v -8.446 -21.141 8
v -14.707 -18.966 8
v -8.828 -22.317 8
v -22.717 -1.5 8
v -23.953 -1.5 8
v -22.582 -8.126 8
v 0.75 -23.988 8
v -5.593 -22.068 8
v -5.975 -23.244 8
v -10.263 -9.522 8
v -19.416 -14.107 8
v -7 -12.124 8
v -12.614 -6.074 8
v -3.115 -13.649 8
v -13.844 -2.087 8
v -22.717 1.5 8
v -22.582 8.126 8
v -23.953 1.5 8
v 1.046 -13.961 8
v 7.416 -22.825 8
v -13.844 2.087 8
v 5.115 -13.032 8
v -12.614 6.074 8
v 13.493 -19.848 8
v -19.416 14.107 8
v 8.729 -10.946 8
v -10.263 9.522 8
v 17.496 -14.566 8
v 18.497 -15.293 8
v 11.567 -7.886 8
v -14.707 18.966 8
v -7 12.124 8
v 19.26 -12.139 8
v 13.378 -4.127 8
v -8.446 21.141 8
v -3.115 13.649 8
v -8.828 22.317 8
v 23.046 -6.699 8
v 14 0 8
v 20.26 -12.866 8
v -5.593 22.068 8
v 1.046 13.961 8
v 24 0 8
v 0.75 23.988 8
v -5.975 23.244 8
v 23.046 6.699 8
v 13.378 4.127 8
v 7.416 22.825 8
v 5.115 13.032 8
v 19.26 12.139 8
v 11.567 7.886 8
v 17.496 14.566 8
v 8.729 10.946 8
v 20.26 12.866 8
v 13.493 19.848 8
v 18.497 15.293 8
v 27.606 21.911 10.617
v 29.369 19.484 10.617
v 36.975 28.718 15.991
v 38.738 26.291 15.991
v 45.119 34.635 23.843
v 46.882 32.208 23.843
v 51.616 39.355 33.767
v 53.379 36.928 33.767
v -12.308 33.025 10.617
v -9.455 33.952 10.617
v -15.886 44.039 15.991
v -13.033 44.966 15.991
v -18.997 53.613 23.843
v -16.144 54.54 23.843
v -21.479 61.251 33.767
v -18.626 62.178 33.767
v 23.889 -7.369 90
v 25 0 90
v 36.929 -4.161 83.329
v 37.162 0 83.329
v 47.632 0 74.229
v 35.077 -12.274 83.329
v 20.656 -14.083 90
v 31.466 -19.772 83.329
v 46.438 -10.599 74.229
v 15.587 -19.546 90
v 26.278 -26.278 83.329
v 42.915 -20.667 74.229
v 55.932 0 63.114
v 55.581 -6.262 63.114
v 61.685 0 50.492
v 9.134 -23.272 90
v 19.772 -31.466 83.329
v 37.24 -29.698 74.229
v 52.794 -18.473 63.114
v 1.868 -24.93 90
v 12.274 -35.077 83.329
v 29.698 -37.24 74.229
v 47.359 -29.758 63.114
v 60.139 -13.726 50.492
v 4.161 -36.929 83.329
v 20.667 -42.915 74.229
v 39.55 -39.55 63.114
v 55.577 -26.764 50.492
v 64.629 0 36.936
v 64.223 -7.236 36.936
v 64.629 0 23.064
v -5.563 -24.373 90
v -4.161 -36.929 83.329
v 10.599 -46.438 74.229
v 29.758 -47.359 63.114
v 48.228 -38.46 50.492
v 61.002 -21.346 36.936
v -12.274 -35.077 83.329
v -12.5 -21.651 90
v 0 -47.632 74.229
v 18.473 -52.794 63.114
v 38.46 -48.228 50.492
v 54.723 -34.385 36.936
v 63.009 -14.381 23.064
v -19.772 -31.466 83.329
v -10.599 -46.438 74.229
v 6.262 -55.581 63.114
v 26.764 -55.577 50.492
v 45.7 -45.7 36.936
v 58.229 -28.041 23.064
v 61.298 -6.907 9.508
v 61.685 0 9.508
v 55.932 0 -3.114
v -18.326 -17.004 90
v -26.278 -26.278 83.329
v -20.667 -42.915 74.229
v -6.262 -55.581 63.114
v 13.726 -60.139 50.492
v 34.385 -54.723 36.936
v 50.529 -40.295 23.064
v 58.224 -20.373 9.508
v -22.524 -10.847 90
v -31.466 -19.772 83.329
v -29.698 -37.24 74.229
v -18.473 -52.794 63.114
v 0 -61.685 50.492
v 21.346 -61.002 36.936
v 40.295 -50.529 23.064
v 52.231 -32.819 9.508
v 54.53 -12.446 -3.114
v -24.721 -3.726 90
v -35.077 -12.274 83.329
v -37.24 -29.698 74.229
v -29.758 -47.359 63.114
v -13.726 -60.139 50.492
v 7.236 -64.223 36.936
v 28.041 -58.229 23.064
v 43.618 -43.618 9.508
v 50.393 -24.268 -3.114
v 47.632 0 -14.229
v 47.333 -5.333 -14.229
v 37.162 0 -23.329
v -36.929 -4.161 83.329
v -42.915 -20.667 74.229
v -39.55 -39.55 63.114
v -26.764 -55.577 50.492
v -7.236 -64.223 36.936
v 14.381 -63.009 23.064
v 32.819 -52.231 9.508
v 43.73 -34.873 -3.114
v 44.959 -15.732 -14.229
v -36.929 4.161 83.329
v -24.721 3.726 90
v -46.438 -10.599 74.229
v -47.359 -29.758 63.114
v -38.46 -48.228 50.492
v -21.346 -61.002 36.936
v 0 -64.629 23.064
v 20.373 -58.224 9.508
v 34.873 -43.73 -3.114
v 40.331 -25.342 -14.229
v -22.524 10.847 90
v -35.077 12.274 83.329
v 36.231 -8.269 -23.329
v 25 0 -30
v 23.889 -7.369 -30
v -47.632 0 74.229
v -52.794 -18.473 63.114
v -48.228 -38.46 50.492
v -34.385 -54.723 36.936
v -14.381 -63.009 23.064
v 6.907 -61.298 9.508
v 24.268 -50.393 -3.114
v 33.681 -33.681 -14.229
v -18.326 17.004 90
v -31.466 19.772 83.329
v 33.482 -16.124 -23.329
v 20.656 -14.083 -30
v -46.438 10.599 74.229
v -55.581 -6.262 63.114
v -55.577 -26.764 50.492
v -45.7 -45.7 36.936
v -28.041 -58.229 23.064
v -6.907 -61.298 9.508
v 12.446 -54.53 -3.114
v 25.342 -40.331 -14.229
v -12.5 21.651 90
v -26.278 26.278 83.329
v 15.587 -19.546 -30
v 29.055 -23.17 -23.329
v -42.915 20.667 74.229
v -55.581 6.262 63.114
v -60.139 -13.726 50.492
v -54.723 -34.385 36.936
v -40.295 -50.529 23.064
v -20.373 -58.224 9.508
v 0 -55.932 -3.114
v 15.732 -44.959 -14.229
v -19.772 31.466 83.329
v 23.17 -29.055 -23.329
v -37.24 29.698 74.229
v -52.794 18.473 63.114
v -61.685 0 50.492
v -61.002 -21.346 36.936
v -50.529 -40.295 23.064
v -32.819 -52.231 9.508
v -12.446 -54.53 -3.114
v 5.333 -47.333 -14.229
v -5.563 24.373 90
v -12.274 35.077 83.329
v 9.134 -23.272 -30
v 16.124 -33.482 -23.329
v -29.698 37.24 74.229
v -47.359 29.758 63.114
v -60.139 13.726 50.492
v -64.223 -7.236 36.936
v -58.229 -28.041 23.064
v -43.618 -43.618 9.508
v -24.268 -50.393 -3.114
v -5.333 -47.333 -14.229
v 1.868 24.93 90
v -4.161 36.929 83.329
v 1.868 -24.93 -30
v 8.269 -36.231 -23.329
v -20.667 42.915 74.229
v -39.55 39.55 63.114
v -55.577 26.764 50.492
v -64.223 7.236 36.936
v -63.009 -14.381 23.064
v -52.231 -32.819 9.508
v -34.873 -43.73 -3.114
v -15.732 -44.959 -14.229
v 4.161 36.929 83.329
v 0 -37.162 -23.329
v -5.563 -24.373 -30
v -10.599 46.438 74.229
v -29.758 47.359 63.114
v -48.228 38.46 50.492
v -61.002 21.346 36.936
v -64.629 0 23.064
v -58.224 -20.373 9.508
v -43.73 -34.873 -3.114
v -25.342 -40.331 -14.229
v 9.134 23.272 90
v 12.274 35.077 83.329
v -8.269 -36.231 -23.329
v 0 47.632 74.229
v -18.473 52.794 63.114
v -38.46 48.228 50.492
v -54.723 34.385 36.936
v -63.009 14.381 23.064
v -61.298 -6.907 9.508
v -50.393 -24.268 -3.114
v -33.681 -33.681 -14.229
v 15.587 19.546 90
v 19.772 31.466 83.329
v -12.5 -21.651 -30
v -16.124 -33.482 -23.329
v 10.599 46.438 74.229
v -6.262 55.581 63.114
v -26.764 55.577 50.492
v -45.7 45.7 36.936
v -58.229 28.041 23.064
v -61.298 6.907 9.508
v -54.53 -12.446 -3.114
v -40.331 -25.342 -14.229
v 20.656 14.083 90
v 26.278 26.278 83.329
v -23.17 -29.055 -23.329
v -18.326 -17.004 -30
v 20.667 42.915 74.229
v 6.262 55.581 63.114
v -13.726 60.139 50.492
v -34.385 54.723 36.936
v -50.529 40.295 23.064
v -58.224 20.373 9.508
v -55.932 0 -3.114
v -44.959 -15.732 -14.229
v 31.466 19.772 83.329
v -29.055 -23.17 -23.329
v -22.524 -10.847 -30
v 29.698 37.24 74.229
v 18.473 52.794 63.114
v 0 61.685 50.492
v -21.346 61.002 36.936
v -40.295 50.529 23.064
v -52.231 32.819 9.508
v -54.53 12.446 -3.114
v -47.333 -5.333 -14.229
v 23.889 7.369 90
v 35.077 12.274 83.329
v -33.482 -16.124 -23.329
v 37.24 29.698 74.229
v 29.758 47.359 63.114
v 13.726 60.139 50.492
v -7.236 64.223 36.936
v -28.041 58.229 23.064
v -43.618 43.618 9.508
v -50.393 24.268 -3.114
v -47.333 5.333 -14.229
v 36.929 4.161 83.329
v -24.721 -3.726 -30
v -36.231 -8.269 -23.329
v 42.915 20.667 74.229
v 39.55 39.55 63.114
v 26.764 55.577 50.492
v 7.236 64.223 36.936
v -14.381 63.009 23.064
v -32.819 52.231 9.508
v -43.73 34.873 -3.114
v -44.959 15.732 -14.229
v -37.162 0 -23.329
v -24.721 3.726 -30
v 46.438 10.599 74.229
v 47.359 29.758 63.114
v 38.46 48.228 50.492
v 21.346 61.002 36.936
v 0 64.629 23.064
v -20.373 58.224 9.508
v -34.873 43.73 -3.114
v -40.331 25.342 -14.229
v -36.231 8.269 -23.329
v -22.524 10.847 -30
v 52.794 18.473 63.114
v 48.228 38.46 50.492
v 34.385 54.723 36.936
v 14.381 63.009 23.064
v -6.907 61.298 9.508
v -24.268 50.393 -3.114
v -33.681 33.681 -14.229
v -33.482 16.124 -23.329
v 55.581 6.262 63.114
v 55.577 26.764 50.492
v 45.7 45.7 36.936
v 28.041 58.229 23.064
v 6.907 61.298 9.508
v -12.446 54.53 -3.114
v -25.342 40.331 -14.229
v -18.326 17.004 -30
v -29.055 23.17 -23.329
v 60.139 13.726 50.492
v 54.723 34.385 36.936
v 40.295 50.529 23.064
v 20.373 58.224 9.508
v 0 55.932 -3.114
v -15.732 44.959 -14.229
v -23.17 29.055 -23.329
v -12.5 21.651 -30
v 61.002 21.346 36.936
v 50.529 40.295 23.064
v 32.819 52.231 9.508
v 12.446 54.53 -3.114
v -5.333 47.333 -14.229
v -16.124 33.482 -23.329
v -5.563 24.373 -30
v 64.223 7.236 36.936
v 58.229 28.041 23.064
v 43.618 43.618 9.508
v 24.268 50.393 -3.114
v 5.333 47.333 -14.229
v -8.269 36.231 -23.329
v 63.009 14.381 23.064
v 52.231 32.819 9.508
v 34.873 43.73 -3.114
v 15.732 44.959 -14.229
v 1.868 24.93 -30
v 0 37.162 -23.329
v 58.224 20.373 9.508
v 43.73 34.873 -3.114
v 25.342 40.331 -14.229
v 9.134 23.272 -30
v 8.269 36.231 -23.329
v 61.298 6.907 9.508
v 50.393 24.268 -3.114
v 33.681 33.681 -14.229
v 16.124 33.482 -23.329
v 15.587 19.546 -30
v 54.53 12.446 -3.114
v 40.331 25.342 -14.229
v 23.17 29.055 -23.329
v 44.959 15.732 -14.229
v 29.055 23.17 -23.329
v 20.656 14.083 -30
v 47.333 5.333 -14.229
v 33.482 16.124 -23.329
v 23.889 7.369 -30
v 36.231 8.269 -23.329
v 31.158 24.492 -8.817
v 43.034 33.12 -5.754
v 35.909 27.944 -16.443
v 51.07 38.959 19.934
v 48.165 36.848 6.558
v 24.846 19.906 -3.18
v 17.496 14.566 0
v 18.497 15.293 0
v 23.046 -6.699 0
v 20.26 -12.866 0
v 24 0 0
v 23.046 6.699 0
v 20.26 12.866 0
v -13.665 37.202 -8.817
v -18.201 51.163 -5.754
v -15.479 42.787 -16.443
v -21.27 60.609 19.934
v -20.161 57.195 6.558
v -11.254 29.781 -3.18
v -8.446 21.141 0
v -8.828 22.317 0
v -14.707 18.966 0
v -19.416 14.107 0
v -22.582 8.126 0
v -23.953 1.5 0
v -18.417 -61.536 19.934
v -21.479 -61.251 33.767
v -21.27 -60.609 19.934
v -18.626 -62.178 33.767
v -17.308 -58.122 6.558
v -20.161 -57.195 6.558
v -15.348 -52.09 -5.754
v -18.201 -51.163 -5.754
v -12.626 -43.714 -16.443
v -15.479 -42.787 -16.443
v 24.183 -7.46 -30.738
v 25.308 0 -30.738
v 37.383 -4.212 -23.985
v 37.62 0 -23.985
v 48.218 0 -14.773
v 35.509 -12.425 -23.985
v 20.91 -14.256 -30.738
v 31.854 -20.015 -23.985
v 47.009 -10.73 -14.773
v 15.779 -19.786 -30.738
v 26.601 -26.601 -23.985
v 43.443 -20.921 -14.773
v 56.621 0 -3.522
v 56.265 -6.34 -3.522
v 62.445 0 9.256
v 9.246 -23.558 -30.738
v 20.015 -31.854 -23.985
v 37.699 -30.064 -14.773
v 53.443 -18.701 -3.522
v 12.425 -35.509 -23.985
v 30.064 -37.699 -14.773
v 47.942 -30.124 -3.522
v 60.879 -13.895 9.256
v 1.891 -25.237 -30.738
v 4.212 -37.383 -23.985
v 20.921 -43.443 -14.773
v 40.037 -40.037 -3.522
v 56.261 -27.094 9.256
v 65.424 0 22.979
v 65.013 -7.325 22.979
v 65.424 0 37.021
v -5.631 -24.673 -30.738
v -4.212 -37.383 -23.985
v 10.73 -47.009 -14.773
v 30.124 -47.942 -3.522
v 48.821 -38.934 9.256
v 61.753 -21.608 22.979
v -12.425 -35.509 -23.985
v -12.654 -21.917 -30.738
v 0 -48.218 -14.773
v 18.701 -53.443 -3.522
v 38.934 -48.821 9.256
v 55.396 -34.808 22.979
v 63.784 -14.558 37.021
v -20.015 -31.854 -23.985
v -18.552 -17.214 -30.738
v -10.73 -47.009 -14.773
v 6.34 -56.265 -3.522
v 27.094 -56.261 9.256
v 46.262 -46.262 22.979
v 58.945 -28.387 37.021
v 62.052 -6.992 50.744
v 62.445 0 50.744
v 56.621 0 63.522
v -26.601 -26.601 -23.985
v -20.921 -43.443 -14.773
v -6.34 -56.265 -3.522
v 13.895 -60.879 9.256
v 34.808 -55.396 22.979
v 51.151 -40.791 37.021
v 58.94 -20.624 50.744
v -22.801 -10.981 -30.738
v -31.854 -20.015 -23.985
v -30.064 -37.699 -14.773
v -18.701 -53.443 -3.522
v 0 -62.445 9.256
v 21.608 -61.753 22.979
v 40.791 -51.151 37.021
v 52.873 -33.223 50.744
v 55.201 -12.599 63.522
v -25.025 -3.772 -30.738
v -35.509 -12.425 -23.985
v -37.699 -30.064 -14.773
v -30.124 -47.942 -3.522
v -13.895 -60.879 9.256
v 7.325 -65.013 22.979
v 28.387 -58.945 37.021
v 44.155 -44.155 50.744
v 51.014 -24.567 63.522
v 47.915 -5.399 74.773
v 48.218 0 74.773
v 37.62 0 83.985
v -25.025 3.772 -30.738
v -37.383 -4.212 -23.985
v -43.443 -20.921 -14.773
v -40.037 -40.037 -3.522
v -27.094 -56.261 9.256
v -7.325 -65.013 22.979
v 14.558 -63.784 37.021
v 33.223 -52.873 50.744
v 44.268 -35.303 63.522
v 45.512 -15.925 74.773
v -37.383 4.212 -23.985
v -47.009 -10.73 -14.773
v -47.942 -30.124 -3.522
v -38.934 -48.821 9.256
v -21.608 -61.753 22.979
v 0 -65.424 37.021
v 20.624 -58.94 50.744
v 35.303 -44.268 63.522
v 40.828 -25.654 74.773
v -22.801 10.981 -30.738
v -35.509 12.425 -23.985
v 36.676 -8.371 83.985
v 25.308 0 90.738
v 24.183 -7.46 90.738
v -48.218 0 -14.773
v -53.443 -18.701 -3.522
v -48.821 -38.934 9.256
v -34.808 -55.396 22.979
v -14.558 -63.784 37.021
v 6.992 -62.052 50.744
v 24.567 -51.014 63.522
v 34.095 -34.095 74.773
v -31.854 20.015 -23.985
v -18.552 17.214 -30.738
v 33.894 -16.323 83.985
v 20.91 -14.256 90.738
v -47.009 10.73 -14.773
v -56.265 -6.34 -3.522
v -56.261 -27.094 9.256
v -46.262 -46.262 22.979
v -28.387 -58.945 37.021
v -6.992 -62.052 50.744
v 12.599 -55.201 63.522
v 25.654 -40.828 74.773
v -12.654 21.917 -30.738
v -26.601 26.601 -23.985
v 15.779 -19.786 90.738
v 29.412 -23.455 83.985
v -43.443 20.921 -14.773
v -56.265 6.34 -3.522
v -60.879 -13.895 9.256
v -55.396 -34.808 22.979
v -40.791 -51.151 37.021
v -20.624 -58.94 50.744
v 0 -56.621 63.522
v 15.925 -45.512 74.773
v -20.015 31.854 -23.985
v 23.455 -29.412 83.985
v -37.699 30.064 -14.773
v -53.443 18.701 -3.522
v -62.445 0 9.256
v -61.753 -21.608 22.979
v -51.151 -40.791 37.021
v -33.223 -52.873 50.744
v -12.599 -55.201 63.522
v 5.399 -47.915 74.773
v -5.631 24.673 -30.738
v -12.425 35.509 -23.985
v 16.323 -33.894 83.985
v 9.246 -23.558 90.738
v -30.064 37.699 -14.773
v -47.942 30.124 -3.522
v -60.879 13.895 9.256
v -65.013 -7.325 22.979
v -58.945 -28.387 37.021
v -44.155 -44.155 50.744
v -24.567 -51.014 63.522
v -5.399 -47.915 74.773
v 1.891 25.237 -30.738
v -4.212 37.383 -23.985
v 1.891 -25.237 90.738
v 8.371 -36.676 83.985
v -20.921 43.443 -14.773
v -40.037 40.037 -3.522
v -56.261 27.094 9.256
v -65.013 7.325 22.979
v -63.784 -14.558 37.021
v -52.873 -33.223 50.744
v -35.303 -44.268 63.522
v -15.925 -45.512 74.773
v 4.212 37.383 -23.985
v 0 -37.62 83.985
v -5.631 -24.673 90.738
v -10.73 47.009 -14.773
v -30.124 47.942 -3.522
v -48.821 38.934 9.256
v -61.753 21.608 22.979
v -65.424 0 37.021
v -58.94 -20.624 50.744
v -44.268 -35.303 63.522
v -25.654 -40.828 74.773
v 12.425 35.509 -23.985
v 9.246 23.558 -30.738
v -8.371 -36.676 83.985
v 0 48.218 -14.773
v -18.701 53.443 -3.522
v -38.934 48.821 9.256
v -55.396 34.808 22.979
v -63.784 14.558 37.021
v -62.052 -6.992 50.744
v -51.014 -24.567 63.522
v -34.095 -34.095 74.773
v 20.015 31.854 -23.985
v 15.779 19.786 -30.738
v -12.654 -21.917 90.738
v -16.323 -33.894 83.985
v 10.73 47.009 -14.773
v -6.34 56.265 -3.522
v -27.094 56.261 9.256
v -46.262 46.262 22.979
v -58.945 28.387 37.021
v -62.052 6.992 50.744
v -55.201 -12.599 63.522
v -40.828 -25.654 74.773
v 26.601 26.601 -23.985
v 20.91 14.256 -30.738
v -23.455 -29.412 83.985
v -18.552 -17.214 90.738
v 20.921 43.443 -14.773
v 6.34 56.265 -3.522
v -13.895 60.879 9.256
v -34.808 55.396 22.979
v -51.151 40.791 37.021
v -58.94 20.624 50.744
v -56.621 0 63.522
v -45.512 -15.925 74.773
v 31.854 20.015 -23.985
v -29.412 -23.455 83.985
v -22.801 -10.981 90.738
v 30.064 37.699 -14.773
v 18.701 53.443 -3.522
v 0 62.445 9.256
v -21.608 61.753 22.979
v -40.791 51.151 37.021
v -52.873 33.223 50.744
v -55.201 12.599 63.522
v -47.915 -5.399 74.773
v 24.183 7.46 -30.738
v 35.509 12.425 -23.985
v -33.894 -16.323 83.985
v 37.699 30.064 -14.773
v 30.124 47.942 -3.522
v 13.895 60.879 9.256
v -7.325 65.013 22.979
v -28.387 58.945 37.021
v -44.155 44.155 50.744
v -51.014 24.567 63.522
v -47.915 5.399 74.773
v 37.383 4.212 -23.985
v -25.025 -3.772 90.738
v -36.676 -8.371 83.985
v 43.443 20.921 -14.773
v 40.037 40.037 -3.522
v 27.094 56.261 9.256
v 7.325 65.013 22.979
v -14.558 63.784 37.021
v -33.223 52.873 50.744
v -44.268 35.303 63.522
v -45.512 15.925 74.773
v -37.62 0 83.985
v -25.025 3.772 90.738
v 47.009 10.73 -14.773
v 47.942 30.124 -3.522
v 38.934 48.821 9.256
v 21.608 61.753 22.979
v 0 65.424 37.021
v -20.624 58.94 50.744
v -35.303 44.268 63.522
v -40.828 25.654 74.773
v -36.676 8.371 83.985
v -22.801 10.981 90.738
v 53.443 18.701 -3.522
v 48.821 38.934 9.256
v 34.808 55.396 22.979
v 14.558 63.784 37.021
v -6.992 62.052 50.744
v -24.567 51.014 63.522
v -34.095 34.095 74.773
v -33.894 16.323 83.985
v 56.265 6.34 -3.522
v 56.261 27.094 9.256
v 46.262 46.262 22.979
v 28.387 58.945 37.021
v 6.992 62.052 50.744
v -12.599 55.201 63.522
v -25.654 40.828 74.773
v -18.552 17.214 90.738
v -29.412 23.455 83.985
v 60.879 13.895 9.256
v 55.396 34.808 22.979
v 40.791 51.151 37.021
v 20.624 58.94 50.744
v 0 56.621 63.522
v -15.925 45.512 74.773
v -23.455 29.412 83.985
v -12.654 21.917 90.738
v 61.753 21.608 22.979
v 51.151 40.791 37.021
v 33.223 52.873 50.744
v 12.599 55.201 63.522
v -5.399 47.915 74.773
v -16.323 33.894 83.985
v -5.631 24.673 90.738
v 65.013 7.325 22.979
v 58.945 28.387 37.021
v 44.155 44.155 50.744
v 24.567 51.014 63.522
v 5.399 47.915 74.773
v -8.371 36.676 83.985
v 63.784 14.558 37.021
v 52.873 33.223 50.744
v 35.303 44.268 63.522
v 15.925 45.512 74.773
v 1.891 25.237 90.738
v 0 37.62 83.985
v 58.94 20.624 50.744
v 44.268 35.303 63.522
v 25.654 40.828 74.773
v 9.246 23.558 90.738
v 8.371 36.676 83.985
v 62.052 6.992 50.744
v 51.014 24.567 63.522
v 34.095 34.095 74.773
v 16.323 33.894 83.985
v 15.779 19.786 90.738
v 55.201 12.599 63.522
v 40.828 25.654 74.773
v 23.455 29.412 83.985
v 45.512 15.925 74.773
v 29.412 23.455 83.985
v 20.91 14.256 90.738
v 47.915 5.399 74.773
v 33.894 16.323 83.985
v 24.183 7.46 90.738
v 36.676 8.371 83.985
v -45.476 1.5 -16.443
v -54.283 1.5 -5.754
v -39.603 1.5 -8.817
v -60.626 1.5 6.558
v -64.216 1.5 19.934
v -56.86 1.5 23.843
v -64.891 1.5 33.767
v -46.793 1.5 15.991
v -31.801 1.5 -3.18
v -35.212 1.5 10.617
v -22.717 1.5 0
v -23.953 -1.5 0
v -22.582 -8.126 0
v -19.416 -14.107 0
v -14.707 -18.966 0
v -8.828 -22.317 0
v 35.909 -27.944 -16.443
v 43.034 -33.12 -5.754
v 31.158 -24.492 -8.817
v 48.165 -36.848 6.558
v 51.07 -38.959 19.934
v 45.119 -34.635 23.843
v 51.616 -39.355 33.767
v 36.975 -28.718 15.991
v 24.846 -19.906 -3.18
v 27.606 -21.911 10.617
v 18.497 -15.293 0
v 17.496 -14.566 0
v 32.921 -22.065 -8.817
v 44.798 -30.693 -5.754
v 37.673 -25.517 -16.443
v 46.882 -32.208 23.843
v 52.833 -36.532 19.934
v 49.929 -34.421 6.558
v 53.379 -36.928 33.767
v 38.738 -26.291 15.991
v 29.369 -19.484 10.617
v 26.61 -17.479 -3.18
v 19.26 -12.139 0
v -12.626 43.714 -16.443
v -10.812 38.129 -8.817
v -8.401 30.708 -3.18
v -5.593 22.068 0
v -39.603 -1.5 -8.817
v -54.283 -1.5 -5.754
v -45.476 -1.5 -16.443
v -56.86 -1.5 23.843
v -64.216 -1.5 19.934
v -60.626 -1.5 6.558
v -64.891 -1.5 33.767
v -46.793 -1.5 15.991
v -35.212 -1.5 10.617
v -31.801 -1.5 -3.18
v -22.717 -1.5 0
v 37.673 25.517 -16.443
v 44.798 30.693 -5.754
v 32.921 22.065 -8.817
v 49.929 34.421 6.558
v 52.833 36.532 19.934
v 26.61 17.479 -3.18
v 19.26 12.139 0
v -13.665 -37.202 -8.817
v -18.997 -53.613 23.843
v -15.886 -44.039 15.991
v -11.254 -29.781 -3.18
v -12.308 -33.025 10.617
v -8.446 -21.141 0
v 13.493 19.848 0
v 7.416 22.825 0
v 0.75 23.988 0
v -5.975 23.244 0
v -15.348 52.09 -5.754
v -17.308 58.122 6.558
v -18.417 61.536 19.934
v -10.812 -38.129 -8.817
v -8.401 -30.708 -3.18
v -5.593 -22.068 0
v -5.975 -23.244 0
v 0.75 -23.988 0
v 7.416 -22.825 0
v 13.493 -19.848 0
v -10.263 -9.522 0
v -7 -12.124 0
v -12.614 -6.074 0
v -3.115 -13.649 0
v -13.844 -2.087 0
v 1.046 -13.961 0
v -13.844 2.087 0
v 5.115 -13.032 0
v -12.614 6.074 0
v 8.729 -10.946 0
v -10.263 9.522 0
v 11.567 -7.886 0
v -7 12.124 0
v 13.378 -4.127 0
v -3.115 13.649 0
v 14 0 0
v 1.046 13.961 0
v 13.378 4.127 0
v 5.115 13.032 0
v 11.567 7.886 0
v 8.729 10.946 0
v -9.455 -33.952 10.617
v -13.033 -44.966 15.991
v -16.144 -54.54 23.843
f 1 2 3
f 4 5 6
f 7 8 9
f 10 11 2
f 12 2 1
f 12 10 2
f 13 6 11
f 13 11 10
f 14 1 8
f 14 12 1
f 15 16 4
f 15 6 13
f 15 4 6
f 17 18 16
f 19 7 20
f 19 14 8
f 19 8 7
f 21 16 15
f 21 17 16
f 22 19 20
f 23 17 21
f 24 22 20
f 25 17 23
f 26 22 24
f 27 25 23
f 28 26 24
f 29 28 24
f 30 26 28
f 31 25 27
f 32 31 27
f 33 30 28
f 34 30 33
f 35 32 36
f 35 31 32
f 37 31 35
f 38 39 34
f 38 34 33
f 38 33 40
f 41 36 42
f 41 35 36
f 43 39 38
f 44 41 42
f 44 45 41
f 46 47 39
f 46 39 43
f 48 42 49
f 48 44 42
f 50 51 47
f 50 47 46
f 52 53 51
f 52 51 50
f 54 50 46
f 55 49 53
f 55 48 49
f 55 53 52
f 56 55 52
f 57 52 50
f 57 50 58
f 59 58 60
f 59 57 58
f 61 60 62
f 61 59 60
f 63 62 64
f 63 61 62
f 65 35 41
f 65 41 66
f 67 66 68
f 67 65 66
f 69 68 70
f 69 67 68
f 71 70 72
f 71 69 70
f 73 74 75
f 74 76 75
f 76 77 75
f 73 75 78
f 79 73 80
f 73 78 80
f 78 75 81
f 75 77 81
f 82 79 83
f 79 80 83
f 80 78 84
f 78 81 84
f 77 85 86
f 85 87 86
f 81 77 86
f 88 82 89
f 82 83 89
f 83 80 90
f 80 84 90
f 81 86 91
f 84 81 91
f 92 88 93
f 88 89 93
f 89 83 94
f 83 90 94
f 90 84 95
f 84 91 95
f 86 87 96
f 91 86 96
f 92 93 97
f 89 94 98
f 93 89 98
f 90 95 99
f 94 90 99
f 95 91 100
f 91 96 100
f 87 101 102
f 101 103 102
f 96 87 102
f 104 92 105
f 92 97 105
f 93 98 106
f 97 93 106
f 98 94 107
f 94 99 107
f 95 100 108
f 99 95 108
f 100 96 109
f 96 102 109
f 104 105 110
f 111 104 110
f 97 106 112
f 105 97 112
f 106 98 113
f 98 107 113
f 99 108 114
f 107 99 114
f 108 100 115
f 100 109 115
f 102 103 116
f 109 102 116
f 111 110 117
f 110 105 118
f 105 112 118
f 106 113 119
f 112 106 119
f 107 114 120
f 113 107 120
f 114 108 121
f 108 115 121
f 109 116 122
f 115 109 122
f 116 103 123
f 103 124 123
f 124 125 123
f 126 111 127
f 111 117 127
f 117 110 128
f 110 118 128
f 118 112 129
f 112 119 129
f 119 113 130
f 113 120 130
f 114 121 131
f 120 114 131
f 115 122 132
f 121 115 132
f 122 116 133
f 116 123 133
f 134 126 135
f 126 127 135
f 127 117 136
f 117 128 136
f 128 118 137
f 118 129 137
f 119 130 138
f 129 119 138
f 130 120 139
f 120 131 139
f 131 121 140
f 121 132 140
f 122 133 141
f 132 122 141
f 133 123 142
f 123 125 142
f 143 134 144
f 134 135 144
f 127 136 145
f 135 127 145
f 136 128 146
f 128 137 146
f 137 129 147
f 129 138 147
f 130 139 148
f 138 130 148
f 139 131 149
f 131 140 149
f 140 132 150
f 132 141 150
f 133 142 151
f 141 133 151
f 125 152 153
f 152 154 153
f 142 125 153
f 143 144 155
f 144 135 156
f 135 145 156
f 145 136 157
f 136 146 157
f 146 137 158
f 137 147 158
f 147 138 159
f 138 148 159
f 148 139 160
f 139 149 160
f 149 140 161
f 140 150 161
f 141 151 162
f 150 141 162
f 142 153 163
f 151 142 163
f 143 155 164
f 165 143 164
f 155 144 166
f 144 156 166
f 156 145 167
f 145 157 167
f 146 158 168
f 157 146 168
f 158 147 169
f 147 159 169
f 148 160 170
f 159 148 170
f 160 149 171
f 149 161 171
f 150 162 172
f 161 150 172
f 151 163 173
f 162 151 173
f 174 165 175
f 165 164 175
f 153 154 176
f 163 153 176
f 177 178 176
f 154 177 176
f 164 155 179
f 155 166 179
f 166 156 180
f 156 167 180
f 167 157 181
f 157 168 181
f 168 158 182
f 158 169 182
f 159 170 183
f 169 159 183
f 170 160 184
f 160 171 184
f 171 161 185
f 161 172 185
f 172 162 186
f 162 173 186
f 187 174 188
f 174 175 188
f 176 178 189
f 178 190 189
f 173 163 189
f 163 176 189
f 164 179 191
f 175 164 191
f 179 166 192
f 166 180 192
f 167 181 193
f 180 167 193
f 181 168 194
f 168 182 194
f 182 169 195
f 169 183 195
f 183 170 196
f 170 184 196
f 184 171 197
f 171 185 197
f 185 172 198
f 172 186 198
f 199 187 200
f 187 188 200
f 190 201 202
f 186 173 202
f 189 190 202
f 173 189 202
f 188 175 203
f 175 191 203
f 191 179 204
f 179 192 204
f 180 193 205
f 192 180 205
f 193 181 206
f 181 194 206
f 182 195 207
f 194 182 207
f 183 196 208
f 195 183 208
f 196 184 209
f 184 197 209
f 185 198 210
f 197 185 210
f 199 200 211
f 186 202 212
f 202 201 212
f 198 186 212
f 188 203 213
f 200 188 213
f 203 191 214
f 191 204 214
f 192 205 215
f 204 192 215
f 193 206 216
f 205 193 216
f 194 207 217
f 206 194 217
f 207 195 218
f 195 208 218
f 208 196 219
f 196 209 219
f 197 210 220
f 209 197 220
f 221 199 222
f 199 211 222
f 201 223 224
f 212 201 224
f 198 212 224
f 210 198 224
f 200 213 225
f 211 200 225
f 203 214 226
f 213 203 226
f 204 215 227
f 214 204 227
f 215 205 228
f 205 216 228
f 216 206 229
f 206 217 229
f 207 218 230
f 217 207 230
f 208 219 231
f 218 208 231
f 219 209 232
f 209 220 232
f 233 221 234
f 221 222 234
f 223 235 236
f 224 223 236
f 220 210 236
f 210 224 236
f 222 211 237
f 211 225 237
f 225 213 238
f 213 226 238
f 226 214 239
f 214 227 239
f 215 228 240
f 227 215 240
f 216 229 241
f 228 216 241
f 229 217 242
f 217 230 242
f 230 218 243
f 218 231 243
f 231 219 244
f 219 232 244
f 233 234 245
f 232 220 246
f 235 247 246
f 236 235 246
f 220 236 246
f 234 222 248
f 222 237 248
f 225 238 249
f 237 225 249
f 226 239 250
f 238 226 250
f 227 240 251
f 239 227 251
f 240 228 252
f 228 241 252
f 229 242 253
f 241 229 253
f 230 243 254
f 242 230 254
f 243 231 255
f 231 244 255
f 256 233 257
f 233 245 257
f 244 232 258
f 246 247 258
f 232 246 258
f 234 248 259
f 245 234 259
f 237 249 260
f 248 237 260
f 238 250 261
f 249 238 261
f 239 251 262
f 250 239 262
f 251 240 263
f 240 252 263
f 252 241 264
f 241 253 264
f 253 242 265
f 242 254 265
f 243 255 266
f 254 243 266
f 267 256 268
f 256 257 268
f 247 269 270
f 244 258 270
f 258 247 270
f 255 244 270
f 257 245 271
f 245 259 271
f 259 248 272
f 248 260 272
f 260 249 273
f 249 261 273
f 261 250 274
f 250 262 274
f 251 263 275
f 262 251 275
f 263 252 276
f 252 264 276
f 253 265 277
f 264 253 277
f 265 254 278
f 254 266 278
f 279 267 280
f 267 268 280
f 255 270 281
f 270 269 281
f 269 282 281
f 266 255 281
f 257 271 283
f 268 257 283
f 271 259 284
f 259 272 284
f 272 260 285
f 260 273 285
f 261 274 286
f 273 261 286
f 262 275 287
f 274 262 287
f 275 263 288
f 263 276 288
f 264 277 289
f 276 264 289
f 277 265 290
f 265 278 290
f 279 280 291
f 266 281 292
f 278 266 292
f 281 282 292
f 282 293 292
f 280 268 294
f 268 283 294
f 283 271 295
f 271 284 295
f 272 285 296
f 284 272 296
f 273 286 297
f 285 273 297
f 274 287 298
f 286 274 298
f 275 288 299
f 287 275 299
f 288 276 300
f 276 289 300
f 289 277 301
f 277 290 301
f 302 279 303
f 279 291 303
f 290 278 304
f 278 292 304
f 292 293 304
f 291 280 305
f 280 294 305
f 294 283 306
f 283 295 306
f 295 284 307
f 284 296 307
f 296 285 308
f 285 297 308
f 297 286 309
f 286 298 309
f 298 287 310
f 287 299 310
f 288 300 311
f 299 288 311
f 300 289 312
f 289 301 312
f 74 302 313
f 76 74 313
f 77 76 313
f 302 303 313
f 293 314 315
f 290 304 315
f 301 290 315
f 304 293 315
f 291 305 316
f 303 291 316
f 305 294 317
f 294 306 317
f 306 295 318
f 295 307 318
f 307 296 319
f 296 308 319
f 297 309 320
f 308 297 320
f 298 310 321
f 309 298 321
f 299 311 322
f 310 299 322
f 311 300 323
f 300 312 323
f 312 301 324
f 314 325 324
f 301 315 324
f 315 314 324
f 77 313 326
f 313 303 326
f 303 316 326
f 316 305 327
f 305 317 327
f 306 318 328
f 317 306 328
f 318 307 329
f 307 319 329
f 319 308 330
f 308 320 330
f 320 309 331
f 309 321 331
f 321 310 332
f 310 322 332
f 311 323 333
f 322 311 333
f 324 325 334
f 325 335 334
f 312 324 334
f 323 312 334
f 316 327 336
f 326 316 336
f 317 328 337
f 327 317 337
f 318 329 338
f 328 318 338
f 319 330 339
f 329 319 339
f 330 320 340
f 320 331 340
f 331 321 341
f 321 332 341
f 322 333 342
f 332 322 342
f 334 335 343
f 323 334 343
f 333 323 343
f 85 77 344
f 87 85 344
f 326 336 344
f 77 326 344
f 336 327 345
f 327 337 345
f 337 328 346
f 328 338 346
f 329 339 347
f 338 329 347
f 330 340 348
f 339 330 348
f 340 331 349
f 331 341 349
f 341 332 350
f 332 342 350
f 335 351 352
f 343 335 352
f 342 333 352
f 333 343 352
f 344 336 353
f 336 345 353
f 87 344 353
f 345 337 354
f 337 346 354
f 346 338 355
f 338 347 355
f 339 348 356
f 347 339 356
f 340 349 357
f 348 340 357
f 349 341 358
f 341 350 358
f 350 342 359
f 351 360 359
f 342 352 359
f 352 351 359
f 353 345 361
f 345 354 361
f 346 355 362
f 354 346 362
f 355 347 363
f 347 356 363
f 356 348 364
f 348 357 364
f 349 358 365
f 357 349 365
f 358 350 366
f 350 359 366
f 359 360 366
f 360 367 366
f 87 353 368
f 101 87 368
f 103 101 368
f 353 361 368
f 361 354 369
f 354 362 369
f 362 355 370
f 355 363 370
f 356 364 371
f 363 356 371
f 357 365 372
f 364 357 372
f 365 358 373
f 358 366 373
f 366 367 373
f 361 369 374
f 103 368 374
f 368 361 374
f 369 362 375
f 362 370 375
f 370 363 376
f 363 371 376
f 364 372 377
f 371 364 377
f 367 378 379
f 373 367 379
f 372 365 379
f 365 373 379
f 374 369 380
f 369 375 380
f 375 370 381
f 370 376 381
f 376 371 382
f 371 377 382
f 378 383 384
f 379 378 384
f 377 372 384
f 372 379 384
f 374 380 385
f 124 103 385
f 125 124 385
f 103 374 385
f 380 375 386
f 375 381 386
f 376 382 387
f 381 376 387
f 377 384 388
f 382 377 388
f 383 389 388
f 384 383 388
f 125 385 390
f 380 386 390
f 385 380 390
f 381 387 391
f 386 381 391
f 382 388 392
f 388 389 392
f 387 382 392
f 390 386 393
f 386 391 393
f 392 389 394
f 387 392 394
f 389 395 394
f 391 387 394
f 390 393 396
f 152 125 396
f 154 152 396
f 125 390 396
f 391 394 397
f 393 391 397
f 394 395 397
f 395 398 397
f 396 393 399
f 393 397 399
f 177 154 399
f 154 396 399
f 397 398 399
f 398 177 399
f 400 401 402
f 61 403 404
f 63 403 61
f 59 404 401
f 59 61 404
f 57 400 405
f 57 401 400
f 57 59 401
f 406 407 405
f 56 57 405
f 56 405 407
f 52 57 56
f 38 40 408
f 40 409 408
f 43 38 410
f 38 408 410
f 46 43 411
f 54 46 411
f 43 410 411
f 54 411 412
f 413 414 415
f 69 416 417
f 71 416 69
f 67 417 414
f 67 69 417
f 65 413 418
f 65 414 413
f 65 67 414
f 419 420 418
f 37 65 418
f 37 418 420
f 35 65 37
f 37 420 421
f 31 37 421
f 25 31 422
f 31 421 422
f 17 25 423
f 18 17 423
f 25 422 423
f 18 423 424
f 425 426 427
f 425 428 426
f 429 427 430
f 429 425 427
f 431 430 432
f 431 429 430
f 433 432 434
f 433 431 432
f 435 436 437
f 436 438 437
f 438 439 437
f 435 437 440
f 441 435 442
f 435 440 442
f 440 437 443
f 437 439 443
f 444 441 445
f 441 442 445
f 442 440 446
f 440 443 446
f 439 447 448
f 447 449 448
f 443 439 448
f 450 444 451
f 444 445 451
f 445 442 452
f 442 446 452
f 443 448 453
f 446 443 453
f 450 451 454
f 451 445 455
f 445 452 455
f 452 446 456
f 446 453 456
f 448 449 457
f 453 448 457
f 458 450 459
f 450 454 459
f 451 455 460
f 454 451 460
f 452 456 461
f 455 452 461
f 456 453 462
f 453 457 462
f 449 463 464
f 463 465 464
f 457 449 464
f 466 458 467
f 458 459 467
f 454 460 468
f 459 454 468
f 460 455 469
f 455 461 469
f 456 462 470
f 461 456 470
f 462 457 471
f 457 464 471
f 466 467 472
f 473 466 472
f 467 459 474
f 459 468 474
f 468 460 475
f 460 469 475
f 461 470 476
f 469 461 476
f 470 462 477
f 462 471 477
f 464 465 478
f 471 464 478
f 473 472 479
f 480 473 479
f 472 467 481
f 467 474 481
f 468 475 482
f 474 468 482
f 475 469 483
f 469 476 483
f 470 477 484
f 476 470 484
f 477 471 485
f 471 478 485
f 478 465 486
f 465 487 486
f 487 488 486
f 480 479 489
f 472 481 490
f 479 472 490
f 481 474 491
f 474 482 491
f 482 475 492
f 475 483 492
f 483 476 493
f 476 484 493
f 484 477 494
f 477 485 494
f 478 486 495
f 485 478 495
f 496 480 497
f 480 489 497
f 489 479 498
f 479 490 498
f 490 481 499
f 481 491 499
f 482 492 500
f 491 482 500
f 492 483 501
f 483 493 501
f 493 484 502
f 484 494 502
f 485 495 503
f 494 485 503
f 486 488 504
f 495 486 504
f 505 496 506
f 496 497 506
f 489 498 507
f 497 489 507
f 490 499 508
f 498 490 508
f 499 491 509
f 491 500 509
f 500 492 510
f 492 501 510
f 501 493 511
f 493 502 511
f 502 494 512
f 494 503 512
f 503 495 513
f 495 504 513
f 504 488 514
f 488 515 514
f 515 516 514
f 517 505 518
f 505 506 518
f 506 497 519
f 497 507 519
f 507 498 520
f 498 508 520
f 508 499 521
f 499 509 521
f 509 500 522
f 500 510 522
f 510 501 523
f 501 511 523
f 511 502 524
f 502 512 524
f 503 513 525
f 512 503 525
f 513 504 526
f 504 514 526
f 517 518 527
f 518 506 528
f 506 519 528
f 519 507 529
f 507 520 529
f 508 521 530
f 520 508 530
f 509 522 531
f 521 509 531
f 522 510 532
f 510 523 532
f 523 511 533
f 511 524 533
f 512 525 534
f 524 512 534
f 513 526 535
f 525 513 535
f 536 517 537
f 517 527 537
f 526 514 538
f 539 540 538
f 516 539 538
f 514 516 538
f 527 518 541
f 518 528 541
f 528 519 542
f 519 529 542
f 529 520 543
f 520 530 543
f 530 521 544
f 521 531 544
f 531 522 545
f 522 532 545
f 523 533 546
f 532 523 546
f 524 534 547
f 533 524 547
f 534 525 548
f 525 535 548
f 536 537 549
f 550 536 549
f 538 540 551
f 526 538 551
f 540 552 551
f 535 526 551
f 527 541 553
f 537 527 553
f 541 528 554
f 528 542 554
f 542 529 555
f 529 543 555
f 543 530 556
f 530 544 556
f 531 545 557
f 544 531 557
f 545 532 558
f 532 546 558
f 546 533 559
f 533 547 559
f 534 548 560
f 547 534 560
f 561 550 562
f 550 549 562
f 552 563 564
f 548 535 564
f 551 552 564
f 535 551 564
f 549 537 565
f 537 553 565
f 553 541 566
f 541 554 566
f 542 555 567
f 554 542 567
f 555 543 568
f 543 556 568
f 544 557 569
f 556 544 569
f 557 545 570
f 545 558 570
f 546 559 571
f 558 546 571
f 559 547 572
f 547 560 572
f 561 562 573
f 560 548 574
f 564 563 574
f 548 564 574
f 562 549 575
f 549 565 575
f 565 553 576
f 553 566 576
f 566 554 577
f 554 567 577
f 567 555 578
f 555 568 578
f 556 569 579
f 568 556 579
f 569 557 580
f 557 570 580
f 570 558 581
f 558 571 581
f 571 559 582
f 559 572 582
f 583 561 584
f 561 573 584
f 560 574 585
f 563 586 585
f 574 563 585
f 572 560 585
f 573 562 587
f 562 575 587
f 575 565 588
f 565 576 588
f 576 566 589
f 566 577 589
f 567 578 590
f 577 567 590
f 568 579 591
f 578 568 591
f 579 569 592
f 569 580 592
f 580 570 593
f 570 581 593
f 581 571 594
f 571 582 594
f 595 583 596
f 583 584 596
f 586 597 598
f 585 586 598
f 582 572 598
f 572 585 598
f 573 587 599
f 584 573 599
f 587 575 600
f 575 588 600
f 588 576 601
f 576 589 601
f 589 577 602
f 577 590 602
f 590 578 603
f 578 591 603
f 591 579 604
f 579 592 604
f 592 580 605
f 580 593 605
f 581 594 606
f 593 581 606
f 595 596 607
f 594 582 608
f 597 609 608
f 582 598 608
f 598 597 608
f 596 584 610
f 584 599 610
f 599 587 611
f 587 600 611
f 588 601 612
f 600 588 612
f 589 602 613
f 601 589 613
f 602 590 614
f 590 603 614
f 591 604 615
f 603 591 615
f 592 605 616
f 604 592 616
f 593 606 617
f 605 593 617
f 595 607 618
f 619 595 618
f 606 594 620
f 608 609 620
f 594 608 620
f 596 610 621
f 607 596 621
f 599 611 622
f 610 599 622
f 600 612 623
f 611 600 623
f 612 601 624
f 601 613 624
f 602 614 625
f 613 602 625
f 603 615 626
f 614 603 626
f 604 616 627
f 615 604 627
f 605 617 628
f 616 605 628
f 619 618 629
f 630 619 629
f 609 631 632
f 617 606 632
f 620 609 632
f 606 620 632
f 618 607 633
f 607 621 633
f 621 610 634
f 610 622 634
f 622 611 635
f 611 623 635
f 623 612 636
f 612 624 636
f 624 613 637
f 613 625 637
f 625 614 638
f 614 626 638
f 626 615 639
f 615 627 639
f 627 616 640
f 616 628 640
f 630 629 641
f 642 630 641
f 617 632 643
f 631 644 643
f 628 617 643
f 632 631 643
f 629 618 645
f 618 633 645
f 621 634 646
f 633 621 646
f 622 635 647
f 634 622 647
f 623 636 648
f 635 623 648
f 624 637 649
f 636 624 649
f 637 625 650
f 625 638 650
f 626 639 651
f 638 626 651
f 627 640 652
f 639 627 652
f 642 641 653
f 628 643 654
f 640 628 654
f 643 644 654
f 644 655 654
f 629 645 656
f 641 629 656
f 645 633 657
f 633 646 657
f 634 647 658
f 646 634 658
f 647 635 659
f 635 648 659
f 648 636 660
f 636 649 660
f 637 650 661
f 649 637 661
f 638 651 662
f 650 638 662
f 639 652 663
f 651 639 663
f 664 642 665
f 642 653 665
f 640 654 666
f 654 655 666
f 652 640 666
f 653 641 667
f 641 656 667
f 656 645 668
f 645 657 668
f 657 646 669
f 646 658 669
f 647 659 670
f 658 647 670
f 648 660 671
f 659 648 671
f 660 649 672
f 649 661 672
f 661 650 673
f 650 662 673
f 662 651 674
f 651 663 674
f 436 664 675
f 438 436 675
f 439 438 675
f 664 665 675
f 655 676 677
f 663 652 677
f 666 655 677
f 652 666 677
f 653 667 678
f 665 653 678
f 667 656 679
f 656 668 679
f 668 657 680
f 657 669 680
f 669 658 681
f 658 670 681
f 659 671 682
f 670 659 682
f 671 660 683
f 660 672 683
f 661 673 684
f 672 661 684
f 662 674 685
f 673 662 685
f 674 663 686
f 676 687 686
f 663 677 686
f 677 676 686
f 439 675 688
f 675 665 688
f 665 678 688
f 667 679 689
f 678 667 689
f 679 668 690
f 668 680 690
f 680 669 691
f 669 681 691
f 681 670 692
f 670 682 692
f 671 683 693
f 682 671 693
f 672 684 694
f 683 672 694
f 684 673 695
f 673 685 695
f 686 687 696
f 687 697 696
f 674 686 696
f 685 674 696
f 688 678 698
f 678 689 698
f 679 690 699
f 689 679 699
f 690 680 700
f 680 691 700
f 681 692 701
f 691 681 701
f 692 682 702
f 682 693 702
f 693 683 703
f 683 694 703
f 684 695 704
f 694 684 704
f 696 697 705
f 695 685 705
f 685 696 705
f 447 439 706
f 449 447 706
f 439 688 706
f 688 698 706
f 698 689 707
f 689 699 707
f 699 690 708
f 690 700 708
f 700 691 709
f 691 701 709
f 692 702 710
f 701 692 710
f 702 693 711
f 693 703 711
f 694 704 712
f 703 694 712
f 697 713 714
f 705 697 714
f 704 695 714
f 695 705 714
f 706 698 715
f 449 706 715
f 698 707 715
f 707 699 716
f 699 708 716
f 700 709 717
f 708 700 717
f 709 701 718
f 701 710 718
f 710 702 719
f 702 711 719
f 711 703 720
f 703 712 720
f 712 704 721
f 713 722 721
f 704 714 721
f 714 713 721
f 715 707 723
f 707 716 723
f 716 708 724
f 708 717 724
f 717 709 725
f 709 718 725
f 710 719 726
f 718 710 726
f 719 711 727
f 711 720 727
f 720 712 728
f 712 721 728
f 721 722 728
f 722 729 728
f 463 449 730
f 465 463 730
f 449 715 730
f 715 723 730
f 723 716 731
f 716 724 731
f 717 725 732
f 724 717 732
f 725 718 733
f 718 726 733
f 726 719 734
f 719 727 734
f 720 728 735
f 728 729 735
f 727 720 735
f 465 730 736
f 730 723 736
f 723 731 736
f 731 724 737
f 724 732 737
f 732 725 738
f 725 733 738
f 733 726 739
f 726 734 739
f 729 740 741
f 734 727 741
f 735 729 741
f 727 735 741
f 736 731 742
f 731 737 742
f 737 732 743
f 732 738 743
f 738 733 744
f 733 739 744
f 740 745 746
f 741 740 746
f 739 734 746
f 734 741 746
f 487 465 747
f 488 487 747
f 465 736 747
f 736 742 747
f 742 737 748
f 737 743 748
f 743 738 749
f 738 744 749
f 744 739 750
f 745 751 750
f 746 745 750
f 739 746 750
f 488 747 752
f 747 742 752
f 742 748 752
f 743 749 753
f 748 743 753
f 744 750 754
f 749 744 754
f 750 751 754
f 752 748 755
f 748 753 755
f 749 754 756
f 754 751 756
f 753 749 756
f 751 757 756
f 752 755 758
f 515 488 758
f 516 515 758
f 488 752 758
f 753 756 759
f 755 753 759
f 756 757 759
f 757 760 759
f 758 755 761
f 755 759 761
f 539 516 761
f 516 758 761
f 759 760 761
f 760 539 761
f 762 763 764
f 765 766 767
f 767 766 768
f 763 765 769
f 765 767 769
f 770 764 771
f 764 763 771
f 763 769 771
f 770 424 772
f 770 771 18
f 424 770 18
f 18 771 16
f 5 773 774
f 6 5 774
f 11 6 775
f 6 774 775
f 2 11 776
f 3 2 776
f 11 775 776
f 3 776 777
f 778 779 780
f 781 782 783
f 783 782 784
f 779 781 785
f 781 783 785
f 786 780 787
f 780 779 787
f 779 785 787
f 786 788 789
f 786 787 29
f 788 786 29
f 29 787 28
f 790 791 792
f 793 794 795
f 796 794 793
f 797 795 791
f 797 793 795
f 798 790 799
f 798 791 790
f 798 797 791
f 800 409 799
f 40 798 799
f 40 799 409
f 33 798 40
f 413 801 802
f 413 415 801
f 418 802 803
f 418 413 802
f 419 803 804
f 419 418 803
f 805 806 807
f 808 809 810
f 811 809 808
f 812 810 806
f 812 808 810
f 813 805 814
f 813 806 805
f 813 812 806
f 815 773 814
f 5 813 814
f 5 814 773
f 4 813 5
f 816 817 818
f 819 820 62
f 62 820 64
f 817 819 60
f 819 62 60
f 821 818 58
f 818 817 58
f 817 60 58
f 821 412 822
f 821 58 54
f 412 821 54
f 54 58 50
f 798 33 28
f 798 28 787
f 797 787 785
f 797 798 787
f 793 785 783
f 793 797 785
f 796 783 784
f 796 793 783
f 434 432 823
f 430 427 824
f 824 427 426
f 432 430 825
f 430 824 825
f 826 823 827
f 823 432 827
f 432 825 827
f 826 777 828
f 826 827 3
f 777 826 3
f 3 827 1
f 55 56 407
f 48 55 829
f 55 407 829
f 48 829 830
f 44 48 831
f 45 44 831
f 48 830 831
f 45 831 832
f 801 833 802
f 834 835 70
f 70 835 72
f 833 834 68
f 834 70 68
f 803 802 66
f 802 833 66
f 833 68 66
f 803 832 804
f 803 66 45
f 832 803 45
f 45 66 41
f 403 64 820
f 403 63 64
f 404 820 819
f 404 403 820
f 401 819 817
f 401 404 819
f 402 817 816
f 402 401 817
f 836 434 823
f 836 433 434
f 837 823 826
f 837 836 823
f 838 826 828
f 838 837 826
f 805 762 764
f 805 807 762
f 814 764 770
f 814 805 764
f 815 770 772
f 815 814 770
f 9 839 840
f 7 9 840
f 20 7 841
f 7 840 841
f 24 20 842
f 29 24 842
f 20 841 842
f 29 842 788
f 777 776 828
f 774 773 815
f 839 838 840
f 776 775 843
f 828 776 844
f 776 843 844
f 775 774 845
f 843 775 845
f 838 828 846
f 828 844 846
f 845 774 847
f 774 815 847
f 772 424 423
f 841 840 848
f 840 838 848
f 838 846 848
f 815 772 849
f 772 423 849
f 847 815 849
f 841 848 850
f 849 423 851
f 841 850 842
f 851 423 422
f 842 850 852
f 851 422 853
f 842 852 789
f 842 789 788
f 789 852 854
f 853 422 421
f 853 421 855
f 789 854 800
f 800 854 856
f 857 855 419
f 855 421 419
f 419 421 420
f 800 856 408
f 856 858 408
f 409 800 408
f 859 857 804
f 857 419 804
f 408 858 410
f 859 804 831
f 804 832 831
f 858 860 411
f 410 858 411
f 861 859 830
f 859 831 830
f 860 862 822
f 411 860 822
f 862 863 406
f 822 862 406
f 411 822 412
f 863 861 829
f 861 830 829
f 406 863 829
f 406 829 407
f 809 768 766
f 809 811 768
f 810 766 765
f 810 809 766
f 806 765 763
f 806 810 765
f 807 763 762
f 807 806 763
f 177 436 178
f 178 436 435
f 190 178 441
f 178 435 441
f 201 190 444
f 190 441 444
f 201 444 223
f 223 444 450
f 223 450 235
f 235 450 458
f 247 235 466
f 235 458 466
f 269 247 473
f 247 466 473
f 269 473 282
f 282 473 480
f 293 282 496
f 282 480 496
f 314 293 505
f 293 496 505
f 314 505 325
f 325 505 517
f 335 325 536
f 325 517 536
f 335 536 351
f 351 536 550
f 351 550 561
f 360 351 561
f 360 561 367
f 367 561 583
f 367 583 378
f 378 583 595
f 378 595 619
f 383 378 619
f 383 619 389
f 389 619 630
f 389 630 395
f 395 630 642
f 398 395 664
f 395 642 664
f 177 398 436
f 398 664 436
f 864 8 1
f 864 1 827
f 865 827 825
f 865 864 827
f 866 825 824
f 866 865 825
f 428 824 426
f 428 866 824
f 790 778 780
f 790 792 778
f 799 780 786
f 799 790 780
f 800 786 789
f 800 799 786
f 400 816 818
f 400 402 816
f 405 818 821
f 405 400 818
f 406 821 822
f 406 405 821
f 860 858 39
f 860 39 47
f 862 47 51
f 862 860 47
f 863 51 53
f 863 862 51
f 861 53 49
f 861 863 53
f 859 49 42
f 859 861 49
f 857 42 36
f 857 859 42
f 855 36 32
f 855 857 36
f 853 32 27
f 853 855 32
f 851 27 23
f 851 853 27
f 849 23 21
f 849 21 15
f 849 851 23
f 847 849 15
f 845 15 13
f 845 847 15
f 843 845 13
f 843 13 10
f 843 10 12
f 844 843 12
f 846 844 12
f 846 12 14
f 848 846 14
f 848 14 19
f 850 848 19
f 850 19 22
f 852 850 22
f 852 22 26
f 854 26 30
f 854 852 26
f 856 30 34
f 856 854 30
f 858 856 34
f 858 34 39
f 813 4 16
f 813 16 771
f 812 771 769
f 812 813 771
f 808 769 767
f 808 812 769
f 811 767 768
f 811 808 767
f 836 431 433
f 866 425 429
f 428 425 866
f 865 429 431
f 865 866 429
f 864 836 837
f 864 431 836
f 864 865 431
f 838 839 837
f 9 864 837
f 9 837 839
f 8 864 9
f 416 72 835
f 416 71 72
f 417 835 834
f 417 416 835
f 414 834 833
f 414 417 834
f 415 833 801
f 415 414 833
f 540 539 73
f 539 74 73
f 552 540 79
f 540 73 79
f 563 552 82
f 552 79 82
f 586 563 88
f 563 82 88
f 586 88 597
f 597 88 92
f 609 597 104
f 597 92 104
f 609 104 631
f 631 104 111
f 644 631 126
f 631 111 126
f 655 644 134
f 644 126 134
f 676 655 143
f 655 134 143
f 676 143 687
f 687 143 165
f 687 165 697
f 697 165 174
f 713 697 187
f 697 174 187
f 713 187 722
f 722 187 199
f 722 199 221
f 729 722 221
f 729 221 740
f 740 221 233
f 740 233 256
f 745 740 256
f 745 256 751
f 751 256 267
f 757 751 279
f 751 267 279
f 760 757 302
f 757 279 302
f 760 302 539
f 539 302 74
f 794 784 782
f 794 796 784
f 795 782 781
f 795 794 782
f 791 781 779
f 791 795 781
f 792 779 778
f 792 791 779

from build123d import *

# Parameters (mm, degrees)
F0_R            = 24
F0_R_2          = 14
F1_DEPTH        = 8
F3_DEPTH        = 1.5
F3_COPIES_COUNT = 5


# Not quite as in the source:
# - a pattern or mirror of a feature is missing from the dataset's text; its kind, count and spacing are read off the source's solid


with BuildPart() as f1:
    # F0 (on Top) → F1 (new body)
    with BuildSketch(Plane.XY):
        Circle(F0_R)
        Circle(F0_R_2, mode=Mode.SUBTRACT)
    extrude(amount=F1_DEPTH)

    # F2 (on Front) → F3 (join, symmetric)
    with BuildSketch(Plane.XZ):
        with BuildLine():
            ThreePointArc((-45.4759894192, -16.4428076923), (-35.9063036344, -5.7161120336), (-22.7166505307, 0))
            Line((-22.7166505307, 0), (-22.7166505307, 8))
            ThreePointArc((-22.7166505307, 8), (-46.7930344517, 15.9905951618), (-64.8907626734, 33.7668182409))
            ThreePointArc((-64.8907626734, 33.7668182409), (-60.6255443353, 6.5576585205), (-45.4759894192, -16.4428076923))
        make_face()
    f3 = extrude(amount=F3_DEPTH, both=True)

    # F3_copies: F3 ×5 about axis
    f3_copies_axis = Axis((0, 0, 0), (0, 0, 1))
    for i in range(1, F3_COPIES_COUNT):
        add(f3.rotate(f3_copies_axis, i * 360 / F3_COPIES_COUNT))


with BuildPart() as f5:
    # F4 (on Front) → F5 (revolve)
    with BuildSketch(Plane.XZ):
        with BuildLine():
            ThreePointArc((25, 90), (65, 30), (25, -30))
            Line((25, -30), (25.3076923077, -30.7384615385))
            ThreePointArc((25.3076923077, -30.7384615385), (65.8, 30), (25.3076923077, 90.7384615385))
            Line((25.3076923077, 90.7384615385), (25, 90))
        make_face()
    revolve(axis=Axis((0, 0, 15), (0, 0, -1)))


solid = Compound([f1.part, f5.part])
